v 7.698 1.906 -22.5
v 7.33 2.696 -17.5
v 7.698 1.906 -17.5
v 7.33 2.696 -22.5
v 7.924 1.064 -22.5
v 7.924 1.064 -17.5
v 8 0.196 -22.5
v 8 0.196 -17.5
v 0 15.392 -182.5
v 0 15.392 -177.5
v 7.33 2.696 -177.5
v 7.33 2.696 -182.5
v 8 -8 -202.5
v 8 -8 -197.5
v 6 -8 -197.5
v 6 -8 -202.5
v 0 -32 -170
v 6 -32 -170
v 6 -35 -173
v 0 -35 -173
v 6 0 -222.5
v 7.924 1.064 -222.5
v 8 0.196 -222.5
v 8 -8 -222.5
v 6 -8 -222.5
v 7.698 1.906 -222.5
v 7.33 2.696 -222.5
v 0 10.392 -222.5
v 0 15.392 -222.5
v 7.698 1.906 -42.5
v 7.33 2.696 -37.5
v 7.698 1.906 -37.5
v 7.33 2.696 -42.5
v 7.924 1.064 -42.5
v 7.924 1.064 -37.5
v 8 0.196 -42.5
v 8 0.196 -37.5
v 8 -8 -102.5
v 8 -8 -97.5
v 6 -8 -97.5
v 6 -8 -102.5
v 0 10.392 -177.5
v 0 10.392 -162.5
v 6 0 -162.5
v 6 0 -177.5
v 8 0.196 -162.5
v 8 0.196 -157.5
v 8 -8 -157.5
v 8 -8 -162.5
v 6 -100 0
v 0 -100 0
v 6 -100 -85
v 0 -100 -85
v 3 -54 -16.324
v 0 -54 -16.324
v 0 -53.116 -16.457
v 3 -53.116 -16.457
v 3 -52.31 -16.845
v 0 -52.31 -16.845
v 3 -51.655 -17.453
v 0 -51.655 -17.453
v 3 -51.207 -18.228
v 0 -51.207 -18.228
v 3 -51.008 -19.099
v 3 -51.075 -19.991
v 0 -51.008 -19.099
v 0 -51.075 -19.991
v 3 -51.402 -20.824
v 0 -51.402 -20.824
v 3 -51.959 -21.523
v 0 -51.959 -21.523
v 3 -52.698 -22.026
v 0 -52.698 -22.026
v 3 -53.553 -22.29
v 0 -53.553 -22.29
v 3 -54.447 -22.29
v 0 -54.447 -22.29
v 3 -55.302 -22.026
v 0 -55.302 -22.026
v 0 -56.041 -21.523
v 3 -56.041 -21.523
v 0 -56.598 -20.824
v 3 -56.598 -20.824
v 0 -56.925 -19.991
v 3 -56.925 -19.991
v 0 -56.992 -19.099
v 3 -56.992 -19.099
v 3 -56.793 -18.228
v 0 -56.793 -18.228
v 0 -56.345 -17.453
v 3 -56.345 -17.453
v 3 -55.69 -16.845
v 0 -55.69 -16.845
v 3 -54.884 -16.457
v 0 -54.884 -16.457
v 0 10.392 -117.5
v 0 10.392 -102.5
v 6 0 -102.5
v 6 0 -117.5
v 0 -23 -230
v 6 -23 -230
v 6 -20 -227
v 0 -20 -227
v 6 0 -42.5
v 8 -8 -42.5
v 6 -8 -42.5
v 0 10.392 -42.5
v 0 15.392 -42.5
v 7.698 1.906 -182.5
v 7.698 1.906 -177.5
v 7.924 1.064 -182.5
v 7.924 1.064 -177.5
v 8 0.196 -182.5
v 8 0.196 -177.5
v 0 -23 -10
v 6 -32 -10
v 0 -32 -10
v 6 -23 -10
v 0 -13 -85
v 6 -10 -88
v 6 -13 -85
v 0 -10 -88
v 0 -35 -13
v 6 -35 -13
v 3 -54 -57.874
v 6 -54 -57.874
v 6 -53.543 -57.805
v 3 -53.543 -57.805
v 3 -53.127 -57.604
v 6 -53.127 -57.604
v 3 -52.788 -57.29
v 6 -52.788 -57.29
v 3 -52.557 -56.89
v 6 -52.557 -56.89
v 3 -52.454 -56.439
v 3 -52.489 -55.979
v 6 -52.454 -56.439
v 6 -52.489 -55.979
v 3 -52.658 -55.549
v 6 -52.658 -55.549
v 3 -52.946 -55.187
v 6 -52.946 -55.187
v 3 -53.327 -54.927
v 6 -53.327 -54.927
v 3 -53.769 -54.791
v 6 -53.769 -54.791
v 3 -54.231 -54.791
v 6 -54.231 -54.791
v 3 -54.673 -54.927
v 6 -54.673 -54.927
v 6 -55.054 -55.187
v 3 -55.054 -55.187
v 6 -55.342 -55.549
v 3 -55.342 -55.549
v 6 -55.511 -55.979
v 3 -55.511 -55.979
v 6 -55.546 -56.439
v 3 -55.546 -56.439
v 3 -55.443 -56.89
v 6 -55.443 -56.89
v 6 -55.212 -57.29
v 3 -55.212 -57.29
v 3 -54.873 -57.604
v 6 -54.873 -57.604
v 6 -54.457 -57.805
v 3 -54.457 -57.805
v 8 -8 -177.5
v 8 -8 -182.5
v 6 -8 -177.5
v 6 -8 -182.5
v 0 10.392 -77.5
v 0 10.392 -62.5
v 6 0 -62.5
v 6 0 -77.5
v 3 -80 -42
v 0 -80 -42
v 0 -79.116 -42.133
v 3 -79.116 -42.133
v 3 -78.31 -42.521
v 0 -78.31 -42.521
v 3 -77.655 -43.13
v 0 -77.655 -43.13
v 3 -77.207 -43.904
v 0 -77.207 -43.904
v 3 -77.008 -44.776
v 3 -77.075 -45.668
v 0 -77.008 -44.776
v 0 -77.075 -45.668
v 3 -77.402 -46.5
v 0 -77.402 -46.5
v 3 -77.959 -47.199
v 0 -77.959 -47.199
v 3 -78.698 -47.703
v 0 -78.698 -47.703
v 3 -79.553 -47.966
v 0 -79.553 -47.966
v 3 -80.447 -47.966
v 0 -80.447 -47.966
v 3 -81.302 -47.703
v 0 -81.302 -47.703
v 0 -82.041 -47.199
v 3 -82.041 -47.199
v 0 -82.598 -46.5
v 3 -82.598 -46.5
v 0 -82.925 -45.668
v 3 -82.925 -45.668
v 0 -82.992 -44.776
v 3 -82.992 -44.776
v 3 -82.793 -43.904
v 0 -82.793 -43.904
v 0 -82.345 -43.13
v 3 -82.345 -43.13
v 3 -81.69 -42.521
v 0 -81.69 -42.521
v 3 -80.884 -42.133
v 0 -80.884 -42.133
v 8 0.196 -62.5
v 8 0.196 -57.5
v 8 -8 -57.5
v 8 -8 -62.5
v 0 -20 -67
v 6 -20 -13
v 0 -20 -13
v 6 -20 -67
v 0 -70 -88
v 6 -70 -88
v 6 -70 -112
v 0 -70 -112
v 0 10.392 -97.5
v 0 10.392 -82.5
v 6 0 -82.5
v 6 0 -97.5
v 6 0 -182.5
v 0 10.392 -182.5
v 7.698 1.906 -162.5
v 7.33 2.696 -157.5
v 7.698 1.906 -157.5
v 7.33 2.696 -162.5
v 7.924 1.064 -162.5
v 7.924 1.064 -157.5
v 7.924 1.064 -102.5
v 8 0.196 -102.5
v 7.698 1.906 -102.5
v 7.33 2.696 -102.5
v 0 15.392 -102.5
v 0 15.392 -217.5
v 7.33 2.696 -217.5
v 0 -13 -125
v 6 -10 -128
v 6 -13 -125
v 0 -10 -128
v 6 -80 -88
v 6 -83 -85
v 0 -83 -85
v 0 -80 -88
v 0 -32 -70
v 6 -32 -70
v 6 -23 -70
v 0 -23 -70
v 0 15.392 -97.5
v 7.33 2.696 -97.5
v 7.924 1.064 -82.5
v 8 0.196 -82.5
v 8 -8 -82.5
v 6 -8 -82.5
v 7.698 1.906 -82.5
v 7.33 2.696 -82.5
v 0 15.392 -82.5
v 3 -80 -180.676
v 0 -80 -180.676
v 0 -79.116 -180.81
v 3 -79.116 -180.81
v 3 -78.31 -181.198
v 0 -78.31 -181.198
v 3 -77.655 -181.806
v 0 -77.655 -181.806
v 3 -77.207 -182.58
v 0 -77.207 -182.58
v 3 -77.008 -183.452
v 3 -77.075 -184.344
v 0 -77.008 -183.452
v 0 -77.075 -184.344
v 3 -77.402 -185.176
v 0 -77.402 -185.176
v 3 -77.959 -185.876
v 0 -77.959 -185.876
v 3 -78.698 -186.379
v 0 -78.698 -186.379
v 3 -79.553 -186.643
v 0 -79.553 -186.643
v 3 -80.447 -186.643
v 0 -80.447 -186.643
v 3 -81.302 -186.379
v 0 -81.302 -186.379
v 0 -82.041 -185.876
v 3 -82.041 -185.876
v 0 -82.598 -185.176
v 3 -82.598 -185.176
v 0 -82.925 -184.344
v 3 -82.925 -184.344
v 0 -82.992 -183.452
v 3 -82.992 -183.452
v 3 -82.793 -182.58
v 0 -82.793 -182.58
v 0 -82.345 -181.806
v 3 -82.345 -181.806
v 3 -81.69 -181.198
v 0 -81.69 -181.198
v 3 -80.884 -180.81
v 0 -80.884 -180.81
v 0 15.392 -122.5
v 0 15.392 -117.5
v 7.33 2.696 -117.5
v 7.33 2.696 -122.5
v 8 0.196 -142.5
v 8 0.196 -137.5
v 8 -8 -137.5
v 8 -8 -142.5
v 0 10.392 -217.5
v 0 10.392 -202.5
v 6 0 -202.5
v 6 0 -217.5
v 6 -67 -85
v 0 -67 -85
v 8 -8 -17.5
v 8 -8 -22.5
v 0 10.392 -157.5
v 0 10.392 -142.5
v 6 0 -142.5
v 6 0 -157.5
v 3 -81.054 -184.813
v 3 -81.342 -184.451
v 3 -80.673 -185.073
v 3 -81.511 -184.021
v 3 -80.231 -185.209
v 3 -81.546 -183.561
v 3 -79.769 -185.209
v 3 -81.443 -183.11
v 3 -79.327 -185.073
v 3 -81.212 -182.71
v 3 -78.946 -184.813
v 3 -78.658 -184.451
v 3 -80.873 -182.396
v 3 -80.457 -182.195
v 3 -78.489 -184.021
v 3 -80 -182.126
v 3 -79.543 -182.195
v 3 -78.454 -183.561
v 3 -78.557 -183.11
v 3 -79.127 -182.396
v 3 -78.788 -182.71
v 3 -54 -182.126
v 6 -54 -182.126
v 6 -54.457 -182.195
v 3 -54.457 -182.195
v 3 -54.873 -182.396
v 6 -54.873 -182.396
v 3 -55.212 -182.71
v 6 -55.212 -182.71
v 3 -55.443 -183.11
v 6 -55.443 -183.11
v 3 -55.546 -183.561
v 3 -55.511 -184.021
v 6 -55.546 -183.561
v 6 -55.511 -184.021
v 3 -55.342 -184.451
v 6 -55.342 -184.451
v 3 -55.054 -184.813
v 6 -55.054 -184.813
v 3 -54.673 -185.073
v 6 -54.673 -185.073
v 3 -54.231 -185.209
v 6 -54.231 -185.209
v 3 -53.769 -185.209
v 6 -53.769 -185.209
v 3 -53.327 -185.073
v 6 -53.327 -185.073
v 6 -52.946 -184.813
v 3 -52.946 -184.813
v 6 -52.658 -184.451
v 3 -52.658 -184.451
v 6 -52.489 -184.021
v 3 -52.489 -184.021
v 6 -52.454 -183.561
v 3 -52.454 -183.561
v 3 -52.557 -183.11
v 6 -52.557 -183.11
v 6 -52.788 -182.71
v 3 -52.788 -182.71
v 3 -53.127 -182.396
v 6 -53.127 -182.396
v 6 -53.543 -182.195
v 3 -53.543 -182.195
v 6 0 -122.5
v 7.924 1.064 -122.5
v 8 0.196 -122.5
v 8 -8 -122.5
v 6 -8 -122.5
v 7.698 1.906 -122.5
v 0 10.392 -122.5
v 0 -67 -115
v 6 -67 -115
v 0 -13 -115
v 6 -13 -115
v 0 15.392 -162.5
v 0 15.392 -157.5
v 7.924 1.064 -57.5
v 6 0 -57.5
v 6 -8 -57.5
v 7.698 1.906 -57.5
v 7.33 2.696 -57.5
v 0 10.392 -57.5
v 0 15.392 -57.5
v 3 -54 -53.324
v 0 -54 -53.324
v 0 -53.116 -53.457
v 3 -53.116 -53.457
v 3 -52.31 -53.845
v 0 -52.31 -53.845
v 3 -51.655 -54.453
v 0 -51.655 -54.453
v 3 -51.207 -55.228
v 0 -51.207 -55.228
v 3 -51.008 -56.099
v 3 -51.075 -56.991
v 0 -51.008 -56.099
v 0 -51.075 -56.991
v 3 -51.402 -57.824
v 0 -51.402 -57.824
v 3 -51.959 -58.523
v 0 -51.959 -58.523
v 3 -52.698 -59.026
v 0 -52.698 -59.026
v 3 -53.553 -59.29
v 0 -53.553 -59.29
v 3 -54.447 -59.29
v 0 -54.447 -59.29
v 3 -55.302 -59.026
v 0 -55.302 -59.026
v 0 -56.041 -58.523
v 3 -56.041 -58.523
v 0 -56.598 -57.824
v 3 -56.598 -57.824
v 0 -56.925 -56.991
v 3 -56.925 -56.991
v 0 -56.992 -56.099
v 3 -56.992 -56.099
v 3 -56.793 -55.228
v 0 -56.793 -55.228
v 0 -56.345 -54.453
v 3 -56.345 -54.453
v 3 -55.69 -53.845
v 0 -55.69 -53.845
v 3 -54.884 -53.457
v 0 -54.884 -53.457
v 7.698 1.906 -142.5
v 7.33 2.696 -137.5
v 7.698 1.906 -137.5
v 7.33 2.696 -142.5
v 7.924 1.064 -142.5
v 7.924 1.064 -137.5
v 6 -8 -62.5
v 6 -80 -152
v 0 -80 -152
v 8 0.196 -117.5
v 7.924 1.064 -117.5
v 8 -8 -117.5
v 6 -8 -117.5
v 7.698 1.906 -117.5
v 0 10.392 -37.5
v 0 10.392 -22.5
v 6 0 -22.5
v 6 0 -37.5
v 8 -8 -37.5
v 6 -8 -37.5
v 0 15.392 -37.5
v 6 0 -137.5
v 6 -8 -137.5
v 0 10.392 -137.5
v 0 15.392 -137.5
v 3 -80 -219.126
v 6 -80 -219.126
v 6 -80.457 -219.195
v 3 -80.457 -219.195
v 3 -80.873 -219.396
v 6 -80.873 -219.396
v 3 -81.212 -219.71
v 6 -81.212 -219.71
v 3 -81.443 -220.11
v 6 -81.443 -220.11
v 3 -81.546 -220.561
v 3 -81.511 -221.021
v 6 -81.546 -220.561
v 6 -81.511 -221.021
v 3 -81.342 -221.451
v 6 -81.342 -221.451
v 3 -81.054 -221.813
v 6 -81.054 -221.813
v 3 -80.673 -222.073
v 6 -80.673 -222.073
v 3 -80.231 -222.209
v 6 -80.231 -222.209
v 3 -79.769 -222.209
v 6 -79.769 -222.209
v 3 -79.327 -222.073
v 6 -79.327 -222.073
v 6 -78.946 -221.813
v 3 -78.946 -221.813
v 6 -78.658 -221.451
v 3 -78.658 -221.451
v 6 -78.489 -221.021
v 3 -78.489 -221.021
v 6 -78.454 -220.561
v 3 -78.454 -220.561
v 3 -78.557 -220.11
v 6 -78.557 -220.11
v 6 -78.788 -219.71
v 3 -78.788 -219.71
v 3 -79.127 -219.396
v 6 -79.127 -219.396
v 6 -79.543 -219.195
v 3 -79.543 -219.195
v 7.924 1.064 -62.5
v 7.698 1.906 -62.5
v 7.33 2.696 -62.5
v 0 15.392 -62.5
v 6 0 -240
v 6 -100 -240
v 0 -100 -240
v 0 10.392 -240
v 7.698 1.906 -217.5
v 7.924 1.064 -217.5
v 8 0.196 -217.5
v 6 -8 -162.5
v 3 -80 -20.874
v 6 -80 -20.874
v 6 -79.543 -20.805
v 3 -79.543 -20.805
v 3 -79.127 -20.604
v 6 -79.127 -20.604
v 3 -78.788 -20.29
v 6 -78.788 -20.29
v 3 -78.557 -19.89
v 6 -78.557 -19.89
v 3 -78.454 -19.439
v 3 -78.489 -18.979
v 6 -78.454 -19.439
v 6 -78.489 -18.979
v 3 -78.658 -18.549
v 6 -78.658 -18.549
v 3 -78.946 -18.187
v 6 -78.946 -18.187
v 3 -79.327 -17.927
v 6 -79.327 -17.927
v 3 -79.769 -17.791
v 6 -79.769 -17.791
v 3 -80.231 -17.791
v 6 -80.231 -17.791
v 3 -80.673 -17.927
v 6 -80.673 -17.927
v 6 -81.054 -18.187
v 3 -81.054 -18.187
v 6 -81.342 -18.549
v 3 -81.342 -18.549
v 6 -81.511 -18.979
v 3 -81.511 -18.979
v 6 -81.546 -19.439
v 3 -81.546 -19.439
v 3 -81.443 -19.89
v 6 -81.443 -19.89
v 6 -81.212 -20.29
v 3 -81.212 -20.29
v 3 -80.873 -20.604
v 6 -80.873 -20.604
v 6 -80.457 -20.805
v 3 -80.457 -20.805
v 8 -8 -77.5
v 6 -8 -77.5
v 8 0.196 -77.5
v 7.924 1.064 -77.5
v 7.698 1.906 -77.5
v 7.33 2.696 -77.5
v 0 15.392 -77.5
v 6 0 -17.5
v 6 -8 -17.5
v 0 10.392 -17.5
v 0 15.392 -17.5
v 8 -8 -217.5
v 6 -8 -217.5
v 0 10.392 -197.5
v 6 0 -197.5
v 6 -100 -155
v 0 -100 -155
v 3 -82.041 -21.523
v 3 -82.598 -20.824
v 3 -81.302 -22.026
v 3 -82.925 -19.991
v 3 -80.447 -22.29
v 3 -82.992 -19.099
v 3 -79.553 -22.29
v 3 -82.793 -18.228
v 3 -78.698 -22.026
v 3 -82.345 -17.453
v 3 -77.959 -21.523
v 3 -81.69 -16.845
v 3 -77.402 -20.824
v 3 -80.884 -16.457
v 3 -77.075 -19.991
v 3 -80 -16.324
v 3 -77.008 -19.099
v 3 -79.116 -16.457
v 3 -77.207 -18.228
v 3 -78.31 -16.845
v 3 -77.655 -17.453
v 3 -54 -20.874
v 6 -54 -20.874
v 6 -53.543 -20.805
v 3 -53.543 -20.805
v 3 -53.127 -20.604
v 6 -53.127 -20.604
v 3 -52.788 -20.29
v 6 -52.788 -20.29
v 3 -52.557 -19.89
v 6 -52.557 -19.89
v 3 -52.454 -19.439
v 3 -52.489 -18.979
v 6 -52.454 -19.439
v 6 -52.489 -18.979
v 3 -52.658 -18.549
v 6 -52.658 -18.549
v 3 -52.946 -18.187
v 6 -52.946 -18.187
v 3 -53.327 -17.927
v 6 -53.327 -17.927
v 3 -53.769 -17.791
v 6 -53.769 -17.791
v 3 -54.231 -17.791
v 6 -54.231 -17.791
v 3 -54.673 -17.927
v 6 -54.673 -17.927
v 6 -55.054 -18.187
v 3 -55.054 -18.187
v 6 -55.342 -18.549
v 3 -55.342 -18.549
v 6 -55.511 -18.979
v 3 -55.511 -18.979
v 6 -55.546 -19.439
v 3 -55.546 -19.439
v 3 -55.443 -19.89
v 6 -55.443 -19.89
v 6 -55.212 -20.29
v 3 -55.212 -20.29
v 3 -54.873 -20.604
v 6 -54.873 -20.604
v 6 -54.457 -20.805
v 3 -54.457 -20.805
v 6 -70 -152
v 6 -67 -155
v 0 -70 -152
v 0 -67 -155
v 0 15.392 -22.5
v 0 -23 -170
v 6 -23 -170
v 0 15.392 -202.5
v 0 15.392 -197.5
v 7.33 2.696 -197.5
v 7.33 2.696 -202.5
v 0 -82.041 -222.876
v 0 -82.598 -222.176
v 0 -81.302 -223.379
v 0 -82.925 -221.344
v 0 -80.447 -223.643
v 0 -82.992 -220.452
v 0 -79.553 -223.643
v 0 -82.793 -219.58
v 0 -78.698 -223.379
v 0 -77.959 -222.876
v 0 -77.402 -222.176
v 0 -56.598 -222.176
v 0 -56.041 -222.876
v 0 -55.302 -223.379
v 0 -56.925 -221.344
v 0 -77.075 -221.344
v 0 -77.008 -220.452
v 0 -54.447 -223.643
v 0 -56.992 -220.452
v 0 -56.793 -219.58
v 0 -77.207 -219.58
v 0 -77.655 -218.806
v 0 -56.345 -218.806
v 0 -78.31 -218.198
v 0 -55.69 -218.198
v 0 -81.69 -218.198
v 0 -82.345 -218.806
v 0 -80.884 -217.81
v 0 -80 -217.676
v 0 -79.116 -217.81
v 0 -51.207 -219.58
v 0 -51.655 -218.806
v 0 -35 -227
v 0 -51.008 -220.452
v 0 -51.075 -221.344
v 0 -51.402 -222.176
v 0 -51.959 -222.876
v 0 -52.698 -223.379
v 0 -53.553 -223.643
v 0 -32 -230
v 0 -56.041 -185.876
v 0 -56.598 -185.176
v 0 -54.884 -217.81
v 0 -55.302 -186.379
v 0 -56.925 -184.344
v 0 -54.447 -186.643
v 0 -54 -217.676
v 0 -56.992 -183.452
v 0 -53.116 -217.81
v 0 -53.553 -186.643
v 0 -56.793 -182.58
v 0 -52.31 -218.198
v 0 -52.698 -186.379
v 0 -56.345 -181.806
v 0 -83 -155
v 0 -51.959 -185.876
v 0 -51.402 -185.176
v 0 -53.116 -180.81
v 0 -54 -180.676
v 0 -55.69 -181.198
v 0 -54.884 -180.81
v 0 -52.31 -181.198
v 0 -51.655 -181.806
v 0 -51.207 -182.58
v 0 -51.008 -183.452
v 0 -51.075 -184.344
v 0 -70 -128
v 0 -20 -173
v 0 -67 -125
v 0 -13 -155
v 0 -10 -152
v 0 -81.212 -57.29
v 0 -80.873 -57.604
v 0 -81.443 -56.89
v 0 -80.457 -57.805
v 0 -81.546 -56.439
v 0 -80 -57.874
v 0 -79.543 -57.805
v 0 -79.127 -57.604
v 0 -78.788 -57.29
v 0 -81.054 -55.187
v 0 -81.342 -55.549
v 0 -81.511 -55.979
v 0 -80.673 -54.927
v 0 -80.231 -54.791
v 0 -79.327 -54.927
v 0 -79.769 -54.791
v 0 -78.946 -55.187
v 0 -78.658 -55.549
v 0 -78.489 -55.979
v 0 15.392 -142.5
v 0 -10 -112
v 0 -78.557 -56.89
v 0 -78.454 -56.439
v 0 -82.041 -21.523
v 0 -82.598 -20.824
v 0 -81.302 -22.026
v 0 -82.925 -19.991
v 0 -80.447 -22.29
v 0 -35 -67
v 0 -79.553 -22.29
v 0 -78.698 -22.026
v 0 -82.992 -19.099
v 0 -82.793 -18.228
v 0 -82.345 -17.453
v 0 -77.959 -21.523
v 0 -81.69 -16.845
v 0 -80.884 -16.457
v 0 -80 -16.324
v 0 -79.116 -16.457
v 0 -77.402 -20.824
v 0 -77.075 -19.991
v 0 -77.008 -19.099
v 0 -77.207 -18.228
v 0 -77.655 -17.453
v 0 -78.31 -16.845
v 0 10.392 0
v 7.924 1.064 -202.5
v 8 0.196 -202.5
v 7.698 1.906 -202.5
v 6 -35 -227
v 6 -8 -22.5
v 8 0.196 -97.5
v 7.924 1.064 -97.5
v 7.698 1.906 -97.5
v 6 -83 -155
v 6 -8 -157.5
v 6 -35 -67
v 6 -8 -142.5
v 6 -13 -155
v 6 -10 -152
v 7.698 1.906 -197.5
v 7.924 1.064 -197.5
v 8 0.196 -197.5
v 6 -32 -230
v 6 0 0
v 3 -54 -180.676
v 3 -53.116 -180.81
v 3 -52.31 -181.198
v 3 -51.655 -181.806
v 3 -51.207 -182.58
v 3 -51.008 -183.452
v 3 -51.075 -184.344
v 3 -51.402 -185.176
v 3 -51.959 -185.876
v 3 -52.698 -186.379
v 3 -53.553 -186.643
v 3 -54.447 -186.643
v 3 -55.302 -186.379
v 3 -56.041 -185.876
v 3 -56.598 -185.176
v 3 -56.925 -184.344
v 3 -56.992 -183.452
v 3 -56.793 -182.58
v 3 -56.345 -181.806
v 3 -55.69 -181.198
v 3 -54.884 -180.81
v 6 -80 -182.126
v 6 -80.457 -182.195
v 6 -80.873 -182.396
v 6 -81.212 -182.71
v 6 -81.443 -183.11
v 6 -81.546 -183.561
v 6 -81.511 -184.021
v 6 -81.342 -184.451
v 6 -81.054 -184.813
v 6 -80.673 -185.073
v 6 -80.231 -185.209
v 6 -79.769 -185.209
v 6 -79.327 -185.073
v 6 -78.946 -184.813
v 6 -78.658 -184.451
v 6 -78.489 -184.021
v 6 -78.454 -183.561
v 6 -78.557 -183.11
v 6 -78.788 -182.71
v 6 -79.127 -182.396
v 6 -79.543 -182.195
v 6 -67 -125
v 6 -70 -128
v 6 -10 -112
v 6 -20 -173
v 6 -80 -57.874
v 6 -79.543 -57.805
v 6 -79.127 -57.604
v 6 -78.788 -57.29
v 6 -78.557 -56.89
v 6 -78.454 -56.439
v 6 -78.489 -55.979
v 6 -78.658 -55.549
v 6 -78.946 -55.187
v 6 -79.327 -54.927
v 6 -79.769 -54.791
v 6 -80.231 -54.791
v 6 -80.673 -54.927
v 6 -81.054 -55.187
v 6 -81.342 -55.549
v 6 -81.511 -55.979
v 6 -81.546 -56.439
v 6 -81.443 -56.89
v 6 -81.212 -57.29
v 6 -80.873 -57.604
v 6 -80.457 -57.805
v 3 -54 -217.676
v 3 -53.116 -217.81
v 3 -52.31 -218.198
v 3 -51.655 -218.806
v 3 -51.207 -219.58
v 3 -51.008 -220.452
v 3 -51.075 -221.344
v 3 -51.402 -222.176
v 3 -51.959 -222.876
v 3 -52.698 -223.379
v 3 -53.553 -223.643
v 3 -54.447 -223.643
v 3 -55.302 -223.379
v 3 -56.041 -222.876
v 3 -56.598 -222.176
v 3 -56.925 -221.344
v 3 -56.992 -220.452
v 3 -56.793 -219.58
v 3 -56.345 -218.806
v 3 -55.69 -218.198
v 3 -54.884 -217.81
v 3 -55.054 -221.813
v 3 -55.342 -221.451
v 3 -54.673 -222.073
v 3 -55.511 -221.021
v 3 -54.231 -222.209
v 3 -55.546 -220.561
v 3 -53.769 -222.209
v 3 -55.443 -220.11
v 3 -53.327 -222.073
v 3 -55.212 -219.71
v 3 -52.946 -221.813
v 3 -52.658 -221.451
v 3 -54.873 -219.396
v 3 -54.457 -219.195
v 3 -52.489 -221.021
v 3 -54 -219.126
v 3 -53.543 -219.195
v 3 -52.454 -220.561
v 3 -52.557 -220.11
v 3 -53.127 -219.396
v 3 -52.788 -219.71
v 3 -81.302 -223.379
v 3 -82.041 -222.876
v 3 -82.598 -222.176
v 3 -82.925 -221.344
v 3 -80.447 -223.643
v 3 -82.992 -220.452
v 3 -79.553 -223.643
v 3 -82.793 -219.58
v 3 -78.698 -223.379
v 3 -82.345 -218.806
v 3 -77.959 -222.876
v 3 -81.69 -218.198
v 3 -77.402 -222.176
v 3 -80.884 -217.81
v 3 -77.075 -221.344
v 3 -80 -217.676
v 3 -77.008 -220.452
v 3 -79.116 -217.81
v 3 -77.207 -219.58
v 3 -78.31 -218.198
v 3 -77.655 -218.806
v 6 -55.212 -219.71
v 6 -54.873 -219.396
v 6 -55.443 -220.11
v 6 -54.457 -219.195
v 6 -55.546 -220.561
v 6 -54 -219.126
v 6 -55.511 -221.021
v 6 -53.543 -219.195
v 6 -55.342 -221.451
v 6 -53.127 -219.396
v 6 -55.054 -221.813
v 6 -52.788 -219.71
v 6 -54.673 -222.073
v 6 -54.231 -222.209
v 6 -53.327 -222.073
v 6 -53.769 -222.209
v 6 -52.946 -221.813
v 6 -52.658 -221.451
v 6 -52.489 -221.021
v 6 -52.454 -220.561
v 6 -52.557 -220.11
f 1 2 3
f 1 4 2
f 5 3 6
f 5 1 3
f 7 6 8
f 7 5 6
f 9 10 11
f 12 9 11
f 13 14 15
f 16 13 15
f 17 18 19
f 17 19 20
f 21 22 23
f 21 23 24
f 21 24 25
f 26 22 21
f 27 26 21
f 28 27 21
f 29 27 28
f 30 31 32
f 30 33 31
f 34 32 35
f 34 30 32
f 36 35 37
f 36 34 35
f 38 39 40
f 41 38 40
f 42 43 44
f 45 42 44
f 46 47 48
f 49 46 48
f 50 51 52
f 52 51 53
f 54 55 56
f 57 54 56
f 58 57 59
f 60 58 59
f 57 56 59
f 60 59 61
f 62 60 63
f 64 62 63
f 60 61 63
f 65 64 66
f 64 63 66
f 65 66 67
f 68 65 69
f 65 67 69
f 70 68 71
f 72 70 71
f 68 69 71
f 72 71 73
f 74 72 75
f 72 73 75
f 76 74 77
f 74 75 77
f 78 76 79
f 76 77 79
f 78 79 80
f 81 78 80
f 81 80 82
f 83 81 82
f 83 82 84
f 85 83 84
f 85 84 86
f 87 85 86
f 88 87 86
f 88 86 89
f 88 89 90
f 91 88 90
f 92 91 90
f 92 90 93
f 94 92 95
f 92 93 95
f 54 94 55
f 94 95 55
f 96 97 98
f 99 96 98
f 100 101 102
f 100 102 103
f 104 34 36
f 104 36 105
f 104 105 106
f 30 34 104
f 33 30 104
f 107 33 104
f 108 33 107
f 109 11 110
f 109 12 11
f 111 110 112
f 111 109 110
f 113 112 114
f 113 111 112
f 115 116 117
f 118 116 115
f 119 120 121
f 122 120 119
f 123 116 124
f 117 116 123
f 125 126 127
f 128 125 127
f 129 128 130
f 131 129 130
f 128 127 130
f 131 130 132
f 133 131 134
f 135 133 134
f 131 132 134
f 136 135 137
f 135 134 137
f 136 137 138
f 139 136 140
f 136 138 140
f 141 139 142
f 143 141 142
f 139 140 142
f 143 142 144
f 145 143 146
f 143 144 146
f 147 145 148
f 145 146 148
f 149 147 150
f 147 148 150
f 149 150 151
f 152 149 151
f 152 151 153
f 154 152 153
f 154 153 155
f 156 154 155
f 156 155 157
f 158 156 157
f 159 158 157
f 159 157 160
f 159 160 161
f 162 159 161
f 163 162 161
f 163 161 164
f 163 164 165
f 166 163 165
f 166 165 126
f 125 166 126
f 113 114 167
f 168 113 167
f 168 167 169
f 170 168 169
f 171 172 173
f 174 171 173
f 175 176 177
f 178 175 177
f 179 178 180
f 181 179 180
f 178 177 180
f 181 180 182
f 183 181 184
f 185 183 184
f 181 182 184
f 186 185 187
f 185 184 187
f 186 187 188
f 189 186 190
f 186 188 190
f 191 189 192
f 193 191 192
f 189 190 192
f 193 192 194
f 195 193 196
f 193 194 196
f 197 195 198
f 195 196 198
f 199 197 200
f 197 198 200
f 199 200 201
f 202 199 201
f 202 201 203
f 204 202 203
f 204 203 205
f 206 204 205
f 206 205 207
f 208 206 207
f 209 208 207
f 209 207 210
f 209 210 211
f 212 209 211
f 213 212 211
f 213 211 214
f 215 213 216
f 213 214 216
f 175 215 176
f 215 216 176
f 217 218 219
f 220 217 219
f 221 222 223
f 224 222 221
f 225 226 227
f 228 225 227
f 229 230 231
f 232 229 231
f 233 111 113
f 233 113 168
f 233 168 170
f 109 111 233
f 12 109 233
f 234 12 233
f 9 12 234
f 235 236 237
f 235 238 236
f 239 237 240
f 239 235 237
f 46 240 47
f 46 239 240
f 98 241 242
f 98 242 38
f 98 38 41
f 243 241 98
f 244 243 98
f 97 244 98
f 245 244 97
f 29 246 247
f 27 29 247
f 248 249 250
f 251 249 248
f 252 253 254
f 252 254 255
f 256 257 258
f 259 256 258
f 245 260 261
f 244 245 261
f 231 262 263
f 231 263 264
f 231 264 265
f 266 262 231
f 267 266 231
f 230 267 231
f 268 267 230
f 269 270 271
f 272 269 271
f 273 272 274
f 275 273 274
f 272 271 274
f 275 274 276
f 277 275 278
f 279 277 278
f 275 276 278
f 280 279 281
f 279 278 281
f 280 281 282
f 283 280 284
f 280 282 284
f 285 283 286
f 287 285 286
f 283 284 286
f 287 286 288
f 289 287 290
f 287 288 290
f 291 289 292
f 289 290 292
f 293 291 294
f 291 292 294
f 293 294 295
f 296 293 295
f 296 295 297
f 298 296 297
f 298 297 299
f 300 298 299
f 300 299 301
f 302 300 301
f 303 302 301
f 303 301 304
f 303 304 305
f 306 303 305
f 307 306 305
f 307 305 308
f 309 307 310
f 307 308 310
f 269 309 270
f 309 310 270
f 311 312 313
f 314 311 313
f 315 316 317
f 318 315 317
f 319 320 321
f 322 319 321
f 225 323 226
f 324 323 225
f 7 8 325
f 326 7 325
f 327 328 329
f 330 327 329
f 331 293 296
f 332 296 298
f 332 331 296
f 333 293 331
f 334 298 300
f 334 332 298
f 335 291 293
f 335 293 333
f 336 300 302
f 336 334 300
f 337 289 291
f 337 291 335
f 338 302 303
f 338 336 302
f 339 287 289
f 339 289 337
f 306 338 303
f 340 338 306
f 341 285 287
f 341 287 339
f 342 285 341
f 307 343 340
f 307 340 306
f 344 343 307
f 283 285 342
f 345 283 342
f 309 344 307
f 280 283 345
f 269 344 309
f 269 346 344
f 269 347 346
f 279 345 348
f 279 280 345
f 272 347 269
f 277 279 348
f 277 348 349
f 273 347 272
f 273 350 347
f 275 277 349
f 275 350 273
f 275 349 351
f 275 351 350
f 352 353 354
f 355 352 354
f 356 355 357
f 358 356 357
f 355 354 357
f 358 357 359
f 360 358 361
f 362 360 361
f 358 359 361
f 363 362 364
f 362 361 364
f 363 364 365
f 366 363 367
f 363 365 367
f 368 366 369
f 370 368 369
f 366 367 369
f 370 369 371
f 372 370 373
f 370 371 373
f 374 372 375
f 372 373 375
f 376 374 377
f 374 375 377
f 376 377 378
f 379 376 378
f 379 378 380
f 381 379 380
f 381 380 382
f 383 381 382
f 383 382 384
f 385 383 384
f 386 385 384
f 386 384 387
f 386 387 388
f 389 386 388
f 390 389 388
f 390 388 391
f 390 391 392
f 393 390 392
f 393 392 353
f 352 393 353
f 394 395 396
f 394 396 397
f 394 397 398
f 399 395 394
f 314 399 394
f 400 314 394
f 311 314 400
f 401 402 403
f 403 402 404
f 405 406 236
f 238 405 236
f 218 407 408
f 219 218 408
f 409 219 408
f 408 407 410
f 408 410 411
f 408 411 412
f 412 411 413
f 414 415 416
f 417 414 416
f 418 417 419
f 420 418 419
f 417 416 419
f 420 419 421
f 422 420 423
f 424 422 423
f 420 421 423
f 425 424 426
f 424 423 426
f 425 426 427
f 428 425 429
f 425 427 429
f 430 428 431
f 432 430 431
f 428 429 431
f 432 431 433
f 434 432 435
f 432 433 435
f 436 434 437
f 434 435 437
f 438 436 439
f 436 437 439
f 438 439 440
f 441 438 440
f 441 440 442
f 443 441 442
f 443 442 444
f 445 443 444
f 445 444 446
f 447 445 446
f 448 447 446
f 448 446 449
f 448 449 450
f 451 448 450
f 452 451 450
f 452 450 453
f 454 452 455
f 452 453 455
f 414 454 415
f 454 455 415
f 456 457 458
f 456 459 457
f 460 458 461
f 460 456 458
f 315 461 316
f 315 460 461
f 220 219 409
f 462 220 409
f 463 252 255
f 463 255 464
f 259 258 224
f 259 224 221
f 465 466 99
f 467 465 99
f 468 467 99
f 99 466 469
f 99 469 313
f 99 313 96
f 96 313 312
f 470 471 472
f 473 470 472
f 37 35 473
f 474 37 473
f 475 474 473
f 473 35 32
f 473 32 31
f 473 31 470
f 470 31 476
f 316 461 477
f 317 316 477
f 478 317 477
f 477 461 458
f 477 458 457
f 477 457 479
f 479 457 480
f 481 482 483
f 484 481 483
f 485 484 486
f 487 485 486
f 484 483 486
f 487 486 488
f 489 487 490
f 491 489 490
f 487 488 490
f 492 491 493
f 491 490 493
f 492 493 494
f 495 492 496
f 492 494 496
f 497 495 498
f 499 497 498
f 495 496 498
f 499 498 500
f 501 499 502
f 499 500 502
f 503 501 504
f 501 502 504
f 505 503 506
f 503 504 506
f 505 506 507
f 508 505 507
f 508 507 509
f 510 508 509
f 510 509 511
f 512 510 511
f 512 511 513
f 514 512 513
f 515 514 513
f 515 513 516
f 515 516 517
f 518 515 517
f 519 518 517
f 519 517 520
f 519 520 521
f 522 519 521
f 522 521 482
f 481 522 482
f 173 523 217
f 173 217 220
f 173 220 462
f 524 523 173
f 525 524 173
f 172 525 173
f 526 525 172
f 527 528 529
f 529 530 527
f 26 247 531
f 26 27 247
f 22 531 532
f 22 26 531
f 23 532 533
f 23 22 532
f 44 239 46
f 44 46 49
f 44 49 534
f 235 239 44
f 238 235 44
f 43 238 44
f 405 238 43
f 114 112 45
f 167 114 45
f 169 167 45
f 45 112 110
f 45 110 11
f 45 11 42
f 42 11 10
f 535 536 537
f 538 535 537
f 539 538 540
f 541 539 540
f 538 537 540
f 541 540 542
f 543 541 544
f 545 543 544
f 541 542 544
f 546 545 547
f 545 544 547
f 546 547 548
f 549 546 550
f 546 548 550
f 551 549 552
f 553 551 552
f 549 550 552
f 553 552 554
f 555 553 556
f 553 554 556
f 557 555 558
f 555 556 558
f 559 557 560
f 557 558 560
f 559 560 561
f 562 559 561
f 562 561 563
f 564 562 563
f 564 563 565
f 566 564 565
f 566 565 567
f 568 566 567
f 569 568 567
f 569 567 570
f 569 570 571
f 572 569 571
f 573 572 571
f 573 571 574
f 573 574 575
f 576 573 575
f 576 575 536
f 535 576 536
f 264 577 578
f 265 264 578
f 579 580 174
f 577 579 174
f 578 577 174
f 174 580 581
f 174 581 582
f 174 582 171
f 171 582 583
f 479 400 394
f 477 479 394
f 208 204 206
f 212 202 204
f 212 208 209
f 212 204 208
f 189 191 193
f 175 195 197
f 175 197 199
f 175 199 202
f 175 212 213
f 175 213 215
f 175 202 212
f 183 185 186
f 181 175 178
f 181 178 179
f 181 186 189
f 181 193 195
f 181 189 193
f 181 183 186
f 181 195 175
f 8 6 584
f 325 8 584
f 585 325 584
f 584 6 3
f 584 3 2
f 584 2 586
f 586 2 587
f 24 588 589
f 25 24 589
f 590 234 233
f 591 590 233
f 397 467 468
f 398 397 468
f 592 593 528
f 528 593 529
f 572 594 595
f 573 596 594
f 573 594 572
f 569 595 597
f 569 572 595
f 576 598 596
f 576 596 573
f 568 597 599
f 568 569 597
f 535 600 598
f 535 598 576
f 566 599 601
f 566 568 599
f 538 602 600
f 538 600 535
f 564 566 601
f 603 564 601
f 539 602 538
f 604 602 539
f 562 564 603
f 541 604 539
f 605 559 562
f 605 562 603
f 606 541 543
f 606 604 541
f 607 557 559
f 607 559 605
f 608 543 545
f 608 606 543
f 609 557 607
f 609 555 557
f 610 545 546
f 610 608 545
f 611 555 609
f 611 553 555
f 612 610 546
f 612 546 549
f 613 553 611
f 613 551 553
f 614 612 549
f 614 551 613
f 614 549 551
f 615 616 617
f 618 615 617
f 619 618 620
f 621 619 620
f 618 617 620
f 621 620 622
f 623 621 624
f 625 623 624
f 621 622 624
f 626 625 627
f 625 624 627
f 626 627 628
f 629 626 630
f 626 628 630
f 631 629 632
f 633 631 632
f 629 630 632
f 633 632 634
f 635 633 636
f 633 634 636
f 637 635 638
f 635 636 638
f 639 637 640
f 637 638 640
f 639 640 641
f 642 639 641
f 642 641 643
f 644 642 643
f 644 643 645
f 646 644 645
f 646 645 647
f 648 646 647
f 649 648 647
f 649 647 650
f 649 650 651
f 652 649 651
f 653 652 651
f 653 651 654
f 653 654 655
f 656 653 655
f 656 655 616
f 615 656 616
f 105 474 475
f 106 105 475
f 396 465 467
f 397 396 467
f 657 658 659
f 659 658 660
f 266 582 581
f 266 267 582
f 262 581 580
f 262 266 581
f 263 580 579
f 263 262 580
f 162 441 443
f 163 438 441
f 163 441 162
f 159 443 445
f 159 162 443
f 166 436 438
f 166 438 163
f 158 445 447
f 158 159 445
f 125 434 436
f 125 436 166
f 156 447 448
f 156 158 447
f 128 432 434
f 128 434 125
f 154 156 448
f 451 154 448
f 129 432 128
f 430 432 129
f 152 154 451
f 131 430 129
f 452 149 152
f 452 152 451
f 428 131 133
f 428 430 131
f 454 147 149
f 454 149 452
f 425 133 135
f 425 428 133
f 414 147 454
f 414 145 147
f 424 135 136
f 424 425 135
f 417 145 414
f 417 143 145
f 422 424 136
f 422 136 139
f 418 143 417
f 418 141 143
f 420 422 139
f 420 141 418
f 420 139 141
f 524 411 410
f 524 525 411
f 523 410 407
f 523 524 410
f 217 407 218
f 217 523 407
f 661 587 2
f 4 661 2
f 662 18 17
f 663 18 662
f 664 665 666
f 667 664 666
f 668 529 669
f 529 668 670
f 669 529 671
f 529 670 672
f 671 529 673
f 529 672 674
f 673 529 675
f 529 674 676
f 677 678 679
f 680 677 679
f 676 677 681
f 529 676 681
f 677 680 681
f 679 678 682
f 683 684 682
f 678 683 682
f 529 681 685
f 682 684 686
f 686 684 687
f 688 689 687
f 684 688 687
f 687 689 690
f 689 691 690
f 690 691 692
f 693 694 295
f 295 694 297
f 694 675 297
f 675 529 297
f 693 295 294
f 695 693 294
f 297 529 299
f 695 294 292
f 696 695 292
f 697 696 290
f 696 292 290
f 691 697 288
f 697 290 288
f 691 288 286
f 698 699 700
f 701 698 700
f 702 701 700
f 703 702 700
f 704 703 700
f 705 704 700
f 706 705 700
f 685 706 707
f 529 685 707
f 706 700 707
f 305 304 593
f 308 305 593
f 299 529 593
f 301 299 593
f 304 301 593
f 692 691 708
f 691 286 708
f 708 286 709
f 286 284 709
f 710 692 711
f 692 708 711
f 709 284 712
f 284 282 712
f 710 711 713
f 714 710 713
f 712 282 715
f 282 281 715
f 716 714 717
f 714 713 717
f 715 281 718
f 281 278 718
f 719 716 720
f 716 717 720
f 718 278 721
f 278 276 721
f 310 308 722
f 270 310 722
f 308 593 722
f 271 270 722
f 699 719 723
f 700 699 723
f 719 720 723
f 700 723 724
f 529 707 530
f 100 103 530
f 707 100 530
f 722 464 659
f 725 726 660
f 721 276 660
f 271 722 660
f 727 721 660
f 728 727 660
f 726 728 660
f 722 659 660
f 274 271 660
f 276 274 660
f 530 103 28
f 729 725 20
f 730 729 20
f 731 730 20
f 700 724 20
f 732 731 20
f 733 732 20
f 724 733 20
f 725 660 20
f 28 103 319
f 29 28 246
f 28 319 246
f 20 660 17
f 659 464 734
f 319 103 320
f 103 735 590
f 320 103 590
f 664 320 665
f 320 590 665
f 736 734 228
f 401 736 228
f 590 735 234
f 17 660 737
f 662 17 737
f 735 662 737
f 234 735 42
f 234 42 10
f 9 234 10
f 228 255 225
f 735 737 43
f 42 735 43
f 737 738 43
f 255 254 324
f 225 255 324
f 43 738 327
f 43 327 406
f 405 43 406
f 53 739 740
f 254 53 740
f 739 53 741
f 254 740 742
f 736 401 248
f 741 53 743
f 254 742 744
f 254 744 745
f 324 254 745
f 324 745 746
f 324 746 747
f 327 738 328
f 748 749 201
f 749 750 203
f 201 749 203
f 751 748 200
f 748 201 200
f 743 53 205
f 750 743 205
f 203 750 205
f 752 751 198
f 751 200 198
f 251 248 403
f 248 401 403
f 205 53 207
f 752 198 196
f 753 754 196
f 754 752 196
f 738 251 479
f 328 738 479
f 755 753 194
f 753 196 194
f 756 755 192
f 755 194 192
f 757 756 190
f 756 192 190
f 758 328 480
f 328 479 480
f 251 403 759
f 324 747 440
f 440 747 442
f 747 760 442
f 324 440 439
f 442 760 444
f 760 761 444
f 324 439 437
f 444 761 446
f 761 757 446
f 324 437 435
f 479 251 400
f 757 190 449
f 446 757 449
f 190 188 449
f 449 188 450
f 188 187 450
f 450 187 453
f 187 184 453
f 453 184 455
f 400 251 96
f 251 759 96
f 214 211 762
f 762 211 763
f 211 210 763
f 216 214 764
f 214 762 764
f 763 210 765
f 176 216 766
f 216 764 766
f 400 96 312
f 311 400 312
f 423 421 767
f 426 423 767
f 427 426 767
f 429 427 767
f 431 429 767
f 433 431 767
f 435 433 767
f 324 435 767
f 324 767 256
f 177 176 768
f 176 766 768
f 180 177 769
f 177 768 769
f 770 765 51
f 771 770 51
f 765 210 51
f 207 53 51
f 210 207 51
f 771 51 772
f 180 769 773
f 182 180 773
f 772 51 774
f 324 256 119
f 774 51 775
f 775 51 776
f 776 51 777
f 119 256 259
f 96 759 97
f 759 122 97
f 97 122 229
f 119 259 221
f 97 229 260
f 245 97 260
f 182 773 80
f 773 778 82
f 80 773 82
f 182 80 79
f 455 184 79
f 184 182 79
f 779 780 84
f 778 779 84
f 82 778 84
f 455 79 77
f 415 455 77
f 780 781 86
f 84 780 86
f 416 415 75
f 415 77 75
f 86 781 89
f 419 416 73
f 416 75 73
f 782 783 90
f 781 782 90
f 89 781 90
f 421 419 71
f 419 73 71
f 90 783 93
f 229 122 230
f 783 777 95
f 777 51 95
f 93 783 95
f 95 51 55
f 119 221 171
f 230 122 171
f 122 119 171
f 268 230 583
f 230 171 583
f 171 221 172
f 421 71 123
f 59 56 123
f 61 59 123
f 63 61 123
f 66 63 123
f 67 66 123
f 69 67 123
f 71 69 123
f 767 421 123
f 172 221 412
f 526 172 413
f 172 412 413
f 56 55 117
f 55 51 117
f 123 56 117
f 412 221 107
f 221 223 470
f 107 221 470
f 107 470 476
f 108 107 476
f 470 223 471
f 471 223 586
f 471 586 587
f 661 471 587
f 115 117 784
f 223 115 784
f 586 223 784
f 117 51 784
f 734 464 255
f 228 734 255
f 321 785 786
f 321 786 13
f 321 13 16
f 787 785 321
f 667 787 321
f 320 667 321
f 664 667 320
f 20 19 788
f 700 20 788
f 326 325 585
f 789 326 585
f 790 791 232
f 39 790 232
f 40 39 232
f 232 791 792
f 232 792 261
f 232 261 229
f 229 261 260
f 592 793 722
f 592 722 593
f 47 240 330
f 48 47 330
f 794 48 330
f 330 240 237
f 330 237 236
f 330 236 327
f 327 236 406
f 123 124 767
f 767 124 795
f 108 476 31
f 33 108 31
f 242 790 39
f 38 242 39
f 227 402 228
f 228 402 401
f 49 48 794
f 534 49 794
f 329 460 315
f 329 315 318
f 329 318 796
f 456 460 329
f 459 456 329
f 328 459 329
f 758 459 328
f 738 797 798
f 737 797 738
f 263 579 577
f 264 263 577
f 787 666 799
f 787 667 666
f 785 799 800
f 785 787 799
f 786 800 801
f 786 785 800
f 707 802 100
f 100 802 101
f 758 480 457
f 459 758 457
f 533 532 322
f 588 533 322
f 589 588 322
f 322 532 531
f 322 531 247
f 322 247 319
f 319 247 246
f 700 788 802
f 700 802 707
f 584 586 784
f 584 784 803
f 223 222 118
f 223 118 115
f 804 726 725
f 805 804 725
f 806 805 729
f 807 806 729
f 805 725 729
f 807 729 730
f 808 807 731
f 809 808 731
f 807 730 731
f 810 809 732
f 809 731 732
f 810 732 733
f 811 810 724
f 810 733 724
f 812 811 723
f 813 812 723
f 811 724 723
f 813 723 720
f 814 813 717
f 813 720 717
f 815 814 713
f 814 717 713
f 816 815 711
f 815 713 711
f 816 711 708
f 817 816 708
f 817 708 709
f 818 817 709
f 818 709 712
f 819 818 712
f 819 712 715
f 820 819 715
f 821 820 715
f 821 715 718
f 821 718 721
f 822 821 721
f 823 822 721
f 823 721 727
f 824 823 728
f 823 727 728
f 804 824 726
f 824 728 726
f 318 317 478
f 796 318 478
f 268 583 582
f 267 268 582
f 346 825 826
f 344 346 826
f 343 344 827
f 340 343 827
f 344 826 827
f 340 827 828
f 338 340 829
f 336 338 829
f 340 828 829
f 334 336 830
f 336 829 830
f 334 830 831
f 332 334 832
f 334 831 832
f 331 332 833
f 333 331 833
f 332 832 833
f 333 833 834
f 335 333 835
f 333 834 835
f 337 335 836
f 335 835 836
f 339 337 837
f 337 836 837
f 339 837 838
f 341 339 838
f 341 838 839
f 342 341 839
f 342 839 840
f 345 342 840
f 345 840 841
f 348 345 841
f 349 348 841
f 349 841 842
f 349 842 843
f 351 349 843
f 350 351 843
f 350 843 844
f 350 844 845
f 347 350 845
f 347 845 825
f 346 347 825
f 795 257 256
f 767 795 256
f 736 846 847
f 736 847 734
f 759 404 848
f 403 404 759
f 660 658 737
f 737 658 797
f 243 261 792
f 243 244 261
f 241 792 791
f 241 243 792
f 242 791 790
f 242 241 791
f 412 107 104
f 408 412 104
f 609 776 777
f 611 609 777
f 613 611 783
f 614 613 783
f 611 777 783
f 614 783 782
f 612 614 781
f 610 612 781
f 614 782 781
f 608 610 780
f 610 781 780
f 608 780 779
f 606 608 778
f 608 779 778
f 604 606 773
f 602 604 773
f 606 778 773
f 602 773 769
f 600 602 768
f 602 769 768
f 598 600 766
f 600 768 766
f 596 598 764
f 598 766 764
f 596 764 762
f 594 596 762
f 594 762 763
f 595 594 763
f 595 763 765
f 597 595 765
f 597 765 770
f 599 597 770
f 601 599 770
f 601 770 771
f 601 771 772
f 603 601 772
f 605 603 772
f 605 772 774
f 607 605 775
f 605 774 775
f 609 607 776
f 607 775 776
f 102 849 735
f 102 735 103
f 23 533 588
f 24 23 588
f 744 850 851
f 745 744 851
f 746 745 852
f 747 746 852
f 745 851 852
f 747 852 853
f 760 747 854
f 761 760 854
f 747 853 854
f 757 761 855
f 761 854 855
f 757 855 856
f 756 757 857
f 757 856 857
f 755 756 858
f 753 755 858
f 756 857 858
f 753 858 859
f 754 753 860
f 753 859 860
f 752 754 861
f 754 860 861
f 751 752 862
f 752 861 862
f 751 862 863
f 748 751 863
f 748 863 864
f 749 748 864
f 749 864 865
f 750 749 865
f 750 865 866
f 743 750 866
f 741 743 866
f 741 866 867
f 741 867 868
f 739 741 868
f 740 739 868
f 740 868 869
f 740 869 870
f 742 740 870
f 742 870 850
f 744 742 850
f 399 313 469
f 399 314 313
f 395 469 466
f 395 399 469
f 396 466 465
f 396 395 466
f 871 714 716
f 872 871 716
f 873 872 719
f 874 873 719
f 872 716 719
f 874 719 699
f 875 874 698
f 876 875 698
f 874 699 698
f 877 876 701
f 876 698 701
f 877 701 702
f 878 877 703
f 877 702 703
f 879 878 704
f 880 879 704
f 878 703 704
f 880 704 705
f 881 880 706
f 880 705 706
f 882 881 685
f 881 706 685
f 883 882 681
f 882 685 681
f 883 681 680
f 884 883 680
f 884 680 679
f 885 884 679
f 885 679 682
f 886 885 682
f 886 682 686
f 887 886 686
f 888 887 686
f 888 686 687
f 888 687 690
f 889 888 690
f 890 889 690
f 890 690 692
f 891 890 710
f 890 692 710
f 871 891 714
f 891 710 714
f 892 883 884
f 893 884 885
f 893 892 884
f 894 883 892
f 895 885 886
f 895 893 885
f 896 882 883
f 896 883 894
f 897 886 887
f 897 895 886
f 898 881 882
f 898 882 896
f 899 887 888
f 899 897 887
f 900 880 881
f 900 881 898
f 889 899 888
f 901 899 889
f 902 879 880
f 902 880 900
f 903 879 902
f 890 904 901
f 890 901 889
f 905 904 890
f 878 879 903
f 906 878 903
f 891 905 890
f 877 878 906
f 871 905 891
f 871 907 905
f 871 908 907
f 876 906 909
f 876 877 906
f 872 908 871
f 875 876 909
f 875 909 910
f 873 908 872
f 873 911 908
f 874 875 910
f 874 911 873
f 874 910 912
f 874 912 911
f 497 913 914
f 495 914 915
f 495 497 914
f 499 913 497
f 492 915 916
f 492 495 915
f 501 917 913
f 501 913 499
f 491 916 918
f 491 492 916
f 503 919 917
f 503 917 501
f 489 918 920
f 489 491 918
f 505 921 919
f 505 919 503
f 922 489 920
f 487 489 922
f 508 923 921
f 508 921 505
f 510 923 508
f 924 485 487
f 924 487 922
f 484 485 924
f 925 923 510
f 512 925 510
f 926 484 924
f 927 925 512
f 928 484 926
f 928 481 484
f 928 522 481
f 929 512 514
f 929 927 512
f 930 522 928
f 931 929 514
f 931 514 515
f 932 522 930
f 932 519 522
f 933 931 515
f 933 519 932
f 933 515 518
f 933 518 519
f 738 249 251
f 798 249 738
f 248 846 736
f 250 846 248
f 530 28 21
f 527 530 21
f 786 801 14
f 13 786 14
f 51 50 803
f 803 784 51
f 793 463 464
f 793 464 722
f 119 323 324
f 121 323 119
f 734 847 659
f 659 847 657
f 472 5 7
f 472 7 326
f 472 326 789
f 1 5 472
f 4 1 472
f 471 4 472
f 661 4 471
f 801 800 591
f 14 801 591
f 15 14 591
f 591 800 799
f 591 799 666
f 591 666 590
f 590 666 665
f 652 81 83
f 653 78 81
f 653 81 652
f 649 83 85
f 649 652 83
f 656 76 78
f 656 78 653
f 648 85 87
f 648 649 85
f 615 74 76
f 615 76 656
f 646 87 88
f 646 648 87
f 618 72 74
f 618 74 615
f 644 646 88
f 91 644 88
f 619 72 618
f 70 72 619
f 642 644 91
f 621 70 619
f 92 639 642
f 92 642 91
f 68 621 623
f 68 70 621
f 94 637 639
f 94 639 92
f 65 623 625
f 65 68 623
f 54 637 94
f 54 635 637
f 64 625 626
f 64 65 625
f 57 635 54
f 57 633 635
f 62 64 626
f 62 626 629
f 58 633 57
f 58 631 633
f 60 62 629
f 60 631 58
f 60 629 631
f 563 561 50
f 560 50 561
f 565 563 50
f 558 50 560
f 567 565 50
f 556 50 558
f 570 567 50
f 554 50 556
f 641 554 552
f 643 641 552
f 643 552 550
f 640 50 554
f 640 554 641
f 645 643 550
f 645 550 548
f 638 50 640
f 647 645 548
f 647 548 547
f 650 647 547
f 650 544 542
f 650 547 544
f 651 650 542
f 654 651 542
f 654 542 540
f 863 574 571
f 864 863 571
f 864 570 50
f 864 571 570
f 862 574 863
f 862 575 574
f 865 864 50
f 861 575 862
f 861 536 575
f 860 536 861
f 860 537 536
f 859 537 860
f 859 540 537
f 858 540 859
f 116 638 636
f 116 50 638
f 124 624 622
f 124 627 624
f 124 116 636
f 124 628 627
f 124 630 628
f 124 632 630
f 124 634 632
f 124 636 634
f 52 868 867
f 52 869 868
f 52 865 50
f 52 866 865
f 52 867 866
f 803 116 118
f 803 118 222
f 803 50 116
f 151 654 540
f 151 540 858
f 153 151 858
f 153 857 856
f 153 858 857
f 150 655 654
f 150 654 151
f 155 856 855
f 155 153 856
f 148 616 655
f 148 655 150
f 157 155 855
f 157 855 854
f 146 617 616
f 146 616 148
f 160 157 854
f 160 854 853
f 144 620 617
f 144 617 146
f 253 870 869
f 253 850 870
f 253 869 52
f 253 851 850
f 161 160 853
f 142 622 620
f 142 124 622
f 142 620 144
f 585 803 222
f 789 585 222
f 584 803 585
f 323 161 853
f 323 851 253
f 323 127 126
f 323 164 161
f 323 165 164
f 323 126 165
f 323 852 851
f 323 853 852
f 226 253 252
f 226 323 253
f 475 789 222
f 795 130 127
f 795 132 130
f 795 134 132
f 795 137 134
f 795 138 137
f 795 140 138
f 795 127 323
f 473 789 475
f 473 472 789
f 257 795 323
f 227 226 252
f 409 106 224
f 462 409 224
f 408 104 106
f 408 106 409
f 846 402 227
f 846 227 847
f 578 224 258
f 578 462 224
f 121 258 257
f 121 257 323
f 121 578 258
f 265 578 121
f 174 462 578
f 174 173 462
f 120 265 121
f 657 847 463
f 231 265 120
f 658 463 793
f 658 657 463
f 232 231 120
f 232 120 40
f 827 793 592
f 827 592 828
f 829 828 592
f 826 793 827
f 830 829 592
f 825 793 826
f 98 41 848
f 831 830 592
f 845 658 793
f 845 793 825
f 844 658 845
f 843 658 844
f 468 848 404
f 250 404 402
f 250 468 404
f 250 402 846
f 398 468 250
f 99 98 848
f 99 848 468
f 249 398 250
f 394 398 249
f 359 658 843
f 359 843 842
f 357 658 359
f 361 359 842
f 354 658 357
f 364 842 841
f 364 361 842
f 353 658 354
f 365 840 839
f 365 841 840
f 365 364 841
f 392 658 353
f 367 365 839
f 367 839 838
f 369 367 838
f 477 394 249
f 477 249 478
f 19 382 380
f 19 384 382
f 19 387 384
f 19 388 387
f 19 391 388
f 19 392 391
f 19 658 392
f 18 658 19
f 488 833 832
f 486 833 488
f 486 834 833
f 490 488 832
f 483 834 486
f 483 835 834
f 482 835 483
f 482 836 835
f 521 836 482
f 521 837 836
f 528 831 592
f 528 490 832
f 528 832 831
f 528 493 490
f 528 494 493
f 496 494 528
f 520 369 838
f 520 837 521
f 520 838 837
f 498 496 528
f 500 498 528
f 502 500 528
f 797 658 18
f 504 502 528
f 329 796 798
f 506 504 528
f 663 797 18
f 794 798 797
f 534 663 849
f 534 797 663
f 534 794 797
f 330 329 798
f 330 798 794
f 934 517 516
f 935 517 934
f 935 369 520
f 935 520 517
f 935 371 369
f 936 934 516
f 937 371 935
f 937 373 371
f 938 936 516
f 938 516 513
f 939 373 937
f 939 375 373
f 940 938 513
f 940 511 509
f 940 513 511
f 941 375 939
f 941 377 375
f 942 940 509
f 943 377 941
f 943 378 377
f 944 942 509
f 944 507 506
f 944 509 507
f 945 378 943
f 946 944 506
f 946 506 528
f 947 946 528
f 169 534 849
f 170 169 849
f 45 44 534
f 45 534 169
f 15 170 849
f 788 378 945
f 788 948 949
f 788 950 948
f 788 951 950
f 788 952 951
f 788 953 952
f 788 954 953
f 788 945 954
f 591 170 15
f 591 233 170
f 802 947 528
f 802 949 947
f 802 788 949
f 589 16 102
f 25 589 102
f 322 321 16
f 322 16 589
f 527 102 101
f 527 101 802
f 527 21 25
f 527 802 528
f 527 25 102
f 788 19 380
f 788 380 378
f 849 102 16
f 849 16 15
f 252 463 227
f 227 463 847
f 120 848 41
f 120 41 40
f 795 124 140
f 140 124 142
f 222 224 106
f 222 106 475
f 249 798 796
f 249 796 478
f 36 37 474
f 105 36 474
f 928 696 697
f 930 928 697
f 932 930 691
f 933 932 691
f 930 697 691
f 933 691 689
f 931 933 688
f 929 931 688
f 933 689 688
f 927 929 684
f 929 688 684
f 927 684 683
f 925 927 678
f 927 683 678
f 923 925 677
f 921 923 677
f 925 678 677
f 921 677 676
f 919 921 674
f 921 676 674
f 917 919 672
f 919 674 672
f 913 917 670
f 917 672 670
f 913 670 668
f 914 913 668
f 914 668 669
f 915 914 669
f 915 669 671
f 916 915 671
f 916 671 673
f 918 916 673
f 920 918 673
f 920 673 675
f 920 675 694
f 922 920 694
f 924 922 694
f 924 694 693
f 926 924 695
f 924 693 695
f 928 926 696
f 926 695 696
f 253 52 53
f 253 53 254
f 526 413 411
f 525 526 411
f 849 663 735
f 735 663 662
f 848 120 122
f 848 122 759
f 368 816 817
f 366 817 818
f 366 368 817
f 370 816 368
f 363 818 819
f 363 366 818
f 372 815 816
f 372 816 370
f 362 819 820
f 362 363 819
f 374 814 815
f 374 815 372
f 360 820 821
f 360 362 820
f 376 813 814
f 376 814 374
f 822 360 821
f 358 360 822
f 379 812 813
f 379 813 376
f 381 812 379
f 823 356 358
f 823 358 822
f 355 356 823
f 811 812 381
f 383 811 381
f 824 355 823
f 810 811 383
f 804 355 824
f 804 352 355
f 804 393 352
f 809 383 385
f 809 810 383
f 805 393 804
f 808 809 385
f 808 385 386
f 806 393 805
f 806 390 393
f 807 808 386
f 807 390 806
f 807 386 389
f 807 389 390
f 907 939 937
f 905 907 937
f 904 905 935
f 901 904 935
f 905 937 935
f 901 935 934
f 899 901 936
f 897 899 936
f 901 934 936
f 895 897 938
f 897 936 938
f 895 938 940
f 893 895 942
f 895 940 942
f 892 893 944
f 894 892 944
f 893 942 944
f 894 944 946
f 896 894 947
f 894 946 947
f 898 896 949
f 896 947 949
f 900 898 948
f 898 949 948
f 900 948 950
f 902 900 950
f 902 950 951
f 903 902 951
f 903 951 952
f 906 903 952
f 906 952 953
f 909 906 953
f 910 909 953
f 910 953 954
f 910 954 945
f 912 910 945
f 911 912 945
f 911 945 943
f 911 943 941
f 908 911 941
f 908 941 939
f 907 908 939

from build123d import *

# Parameters (mm, degrees)
SKETCH_1_W                 = 240
SKETCH_1_H                 = 100
EXTRUDE_1_DEPTH            = 6
SKETCH_2_R                 = 1.55
CUT_EXTRUDE_1_DEPTH        = 261.069221555
SKETCH_3_W                 = 60
SKETCH_3_H                 = 15
CUT_EXTRUDE_2_DEPTH        = 261.069221555
SKETCH_4_W                 = 30
SKETCH_4_H                 = 60
CUT_EXTRUDE_3_DEPTH        = 261.069221555
SKETCH_5_R                 = 3
CUT_EXTRUDE_4_DEPTH        = 3
EXTRUDE_2_DEPTH            = 240
EXTRUDE_3_DEPTH            = 5
PATTERN_LINEAR_5_COUNT     = 6
PATTERN_LINEAR_5_PITCH     = 20
PATTERN_LINEAR_5_COL_COUNT = 6
PATTERN_LINEAR_5_COL_PITCH = 20
FILLET_5_R                 = 5
CHAMFER_1_SIZE             = 3
CUT_EXTRUDE_7_DEPTH        = 261.069221555


with BuildPart() as part:
    # 草图1 → 凸台-拉伸1 (new body)
    with BuildSketch(Plane(origin=(0, 0, 0), x_dir=(0, 0, -1), z_dir=(1, 0, 0))):
        with Locations((120, -50)):
            Rectangle(SKETCH_1_W, SKETCH_1_H)
    extrude(amount=EXTRUDE_1_DEPTH)

    # 草图2 → 切除-拉伸1 (cut, through all)
    with BuildSketch(Plane(origin=(6, 0, 0), x_dir=(0, 0, -1), z_dir=(1, 0, 0))):
        with Locations((19.32352941, -54)):
            Circle(SKETCH_2_R)
        with Locations((56.32352941, -80)):
            Circle(SKETCH_2_R)
        with Locations((56.32352941, -54)):
            Circle(SKETCH_2_R)
        with Locations((19.32352941, -80)):
            Circle(SKETCH_2_R)
        with Locations(Location((220.67647059, -80, 0), (0, 0, 180))):
            Circle(SKETCH_2_R)
        with Locations(Location((183.67647059, -54, 0), (0, 0, 180))):
            Circle(SKETCH_2_R)
        with Locations(Location((183.67647059, -80, 0), (0, 0, 180))):
            Circle(SKETCH_2_R)
        with Locations(Location((220.67647059, -54, 0), (0, 0, 180))):
            Circle(SKETCH_2_R)
    extrude(amount=-CUT_EXTRUDE_1_DEPTH, mode=Mode.SUBTRACT)

    # 草图3 → 切除-拉伸2 (cut, through all)
    with BuildSketch(Plane(origin=(6, 0, 0), x_dir=(0, 0, -1), z_dir=(1, 0, 0))):
        with Locations((40, -27.5)):
            Rectangle(SKETCH_3_W, SKETCH_3_H)
        with Locations((200, -27.5)):
            Rectangle(SKETCH_3_W, SKETCH_3_H)
    extrude(amount=-CUT_EXTRUDE_2_DEPTH, mode=Mode.SUBTRACT)

    # 草图4 → 切除-拉伸3 (cut, through all)
    with BuildSketch(Plane(origin=(6, 0, 0), x_dir=(0, 0, -1), z_dir=(1, 0, 0))):
        with Locations((100, -40)):
            Rectangle(SKETCH_4_W, SKETCH_4_H)
        with Locations((140, -40)):
            Rectangle(SKETCH_4_W, SKETCH_4_H)
    extrude(amount=-CUT_EXTRUDE_3_DEPTH, mode=Mode.SUBTRACT)

    # 草图5 → 切除-拉伸4 (cut)
    with BuildSketch(Plane.ZY):
        with Locations((-183.67647059, -80)):
            Circle(SKETCH_5_R)
        with Locations((-220.67647059, -80)):
            Circle(SKETCH_5_R)
        with Locations((-183.67647059, -54)):
            Circle(SKETCH_5_R)
        with Locations((-220.67647059, -54)):
            Circle(SKETCH_5_R)
        with Locations((-45, -80)):
            Circle(SKETCH_5_R)
        with Locations((-19.32352941, -80)):
            Circle(SKETCH_5_R)
        with Locations((-19.32352941, -54)):
            Circle(SKETCH_5_R)
        with Locations((-56.32352941, -54)):
            Circle(SKETCH_5_R)
    extrude(amount=-CUT_EXTRUDE_4_DEPTH, mode=Mode.SUBTRACT)

    # 草图6 → 凸台-拉伸2 (add)
    with BuildSketch(Plane.XY):
        Polygon((6, 0), (0, 0), (0, 10.392304845), align=None)
    extrude(amount=-EXTRUDE_2_DEPTH)

    # 草图7 → 凸台-拉伸3 (add)
    with BuildSketch(Plane.XY.offset(-117.5)):
        Polygon((0, 10.392304845), (0, 15.392304845), (8, 1.535898385), (8, -8), (6, -8), (6, 0), align=None)
    extrude_3 = extrude(amount=-EXTRUDE_3_DEPTH)

    # 阵列(线性)5: 凸台-拉伸3 ×6
    with Locations(*[(0, 0, i * PATTERN_LINEAR_5_PITCH) for i in range(1, PATTERN_LINEAR_5_COUNT)]):
        add(extrude_3)

    # 阵列(线性)5 col: 凸台-拉伸3 ×6
    with Locations(*[(0, 0, -i * PATTERN_LINEAR_5_COL_PITCH) for i in range(1, PATTERN_LINEAR_5_COL_COUNT)]):
        add(extrude_3)

    # 圆角5
    fillet_5_edges = [part.edges().sort_by_distance(p)[0] for p in [
        (8, 1.535898385, -120),
        (8, 1.535898385, -140),
        (8, 1.535898385, -160),
        (8, 1.535898385, -180),
        (8, 1.535898385, -200),
        (8, 1.535898385, -220),
        (8, 1.535898385, -100),
        (8, 1.535898385, -80),
        (8, 1.535898385, -60),
        (8, 1.535898385, -40),
        (8, 1.535898385, -20),
    ]]
    fillet(fillet_5_edges, radius=FILLET_5_R)

    # 倒角1
    chamfer_1_edges = [part.edges().sort_by_distance(p)[0] for p in [
        (3, -35, -10),
        (3, -20, -10),
        (3, -20, -70),
        (3, -35, -70),
        (3, -20, -170),
        (3, -20, -230),
        (3, -35, -230),
        (3, -35, -170),
        (3, -10, -115),
        (3, -70, -115),
        (3, -70, -85),
        (3, -10, -85),
        (3, -10, -125),
        (3, -10, -155),
        (3, -70, -155),
        (3, -70, -125),
    ]]
    chamfer(chamfer_1_edges, length=CHAMFER_1_SIZE)

    # 草图8 → 切除-拉伸7 (cut, through all)
    with BuildSketch(Plane(origin=(6, 0, 0), x_dir=(0, 0, -1), z_dir=(1, 0, 0))):
        Polygon((85, -100), (85, -83), (88, -80), (152, -80), (155, -83), (155, -100), align=None)
    extrude(amount=-CUT_EXTRUDE_7_DEPTH, mode=Mode.SUBTRACT)


solid = part.part
